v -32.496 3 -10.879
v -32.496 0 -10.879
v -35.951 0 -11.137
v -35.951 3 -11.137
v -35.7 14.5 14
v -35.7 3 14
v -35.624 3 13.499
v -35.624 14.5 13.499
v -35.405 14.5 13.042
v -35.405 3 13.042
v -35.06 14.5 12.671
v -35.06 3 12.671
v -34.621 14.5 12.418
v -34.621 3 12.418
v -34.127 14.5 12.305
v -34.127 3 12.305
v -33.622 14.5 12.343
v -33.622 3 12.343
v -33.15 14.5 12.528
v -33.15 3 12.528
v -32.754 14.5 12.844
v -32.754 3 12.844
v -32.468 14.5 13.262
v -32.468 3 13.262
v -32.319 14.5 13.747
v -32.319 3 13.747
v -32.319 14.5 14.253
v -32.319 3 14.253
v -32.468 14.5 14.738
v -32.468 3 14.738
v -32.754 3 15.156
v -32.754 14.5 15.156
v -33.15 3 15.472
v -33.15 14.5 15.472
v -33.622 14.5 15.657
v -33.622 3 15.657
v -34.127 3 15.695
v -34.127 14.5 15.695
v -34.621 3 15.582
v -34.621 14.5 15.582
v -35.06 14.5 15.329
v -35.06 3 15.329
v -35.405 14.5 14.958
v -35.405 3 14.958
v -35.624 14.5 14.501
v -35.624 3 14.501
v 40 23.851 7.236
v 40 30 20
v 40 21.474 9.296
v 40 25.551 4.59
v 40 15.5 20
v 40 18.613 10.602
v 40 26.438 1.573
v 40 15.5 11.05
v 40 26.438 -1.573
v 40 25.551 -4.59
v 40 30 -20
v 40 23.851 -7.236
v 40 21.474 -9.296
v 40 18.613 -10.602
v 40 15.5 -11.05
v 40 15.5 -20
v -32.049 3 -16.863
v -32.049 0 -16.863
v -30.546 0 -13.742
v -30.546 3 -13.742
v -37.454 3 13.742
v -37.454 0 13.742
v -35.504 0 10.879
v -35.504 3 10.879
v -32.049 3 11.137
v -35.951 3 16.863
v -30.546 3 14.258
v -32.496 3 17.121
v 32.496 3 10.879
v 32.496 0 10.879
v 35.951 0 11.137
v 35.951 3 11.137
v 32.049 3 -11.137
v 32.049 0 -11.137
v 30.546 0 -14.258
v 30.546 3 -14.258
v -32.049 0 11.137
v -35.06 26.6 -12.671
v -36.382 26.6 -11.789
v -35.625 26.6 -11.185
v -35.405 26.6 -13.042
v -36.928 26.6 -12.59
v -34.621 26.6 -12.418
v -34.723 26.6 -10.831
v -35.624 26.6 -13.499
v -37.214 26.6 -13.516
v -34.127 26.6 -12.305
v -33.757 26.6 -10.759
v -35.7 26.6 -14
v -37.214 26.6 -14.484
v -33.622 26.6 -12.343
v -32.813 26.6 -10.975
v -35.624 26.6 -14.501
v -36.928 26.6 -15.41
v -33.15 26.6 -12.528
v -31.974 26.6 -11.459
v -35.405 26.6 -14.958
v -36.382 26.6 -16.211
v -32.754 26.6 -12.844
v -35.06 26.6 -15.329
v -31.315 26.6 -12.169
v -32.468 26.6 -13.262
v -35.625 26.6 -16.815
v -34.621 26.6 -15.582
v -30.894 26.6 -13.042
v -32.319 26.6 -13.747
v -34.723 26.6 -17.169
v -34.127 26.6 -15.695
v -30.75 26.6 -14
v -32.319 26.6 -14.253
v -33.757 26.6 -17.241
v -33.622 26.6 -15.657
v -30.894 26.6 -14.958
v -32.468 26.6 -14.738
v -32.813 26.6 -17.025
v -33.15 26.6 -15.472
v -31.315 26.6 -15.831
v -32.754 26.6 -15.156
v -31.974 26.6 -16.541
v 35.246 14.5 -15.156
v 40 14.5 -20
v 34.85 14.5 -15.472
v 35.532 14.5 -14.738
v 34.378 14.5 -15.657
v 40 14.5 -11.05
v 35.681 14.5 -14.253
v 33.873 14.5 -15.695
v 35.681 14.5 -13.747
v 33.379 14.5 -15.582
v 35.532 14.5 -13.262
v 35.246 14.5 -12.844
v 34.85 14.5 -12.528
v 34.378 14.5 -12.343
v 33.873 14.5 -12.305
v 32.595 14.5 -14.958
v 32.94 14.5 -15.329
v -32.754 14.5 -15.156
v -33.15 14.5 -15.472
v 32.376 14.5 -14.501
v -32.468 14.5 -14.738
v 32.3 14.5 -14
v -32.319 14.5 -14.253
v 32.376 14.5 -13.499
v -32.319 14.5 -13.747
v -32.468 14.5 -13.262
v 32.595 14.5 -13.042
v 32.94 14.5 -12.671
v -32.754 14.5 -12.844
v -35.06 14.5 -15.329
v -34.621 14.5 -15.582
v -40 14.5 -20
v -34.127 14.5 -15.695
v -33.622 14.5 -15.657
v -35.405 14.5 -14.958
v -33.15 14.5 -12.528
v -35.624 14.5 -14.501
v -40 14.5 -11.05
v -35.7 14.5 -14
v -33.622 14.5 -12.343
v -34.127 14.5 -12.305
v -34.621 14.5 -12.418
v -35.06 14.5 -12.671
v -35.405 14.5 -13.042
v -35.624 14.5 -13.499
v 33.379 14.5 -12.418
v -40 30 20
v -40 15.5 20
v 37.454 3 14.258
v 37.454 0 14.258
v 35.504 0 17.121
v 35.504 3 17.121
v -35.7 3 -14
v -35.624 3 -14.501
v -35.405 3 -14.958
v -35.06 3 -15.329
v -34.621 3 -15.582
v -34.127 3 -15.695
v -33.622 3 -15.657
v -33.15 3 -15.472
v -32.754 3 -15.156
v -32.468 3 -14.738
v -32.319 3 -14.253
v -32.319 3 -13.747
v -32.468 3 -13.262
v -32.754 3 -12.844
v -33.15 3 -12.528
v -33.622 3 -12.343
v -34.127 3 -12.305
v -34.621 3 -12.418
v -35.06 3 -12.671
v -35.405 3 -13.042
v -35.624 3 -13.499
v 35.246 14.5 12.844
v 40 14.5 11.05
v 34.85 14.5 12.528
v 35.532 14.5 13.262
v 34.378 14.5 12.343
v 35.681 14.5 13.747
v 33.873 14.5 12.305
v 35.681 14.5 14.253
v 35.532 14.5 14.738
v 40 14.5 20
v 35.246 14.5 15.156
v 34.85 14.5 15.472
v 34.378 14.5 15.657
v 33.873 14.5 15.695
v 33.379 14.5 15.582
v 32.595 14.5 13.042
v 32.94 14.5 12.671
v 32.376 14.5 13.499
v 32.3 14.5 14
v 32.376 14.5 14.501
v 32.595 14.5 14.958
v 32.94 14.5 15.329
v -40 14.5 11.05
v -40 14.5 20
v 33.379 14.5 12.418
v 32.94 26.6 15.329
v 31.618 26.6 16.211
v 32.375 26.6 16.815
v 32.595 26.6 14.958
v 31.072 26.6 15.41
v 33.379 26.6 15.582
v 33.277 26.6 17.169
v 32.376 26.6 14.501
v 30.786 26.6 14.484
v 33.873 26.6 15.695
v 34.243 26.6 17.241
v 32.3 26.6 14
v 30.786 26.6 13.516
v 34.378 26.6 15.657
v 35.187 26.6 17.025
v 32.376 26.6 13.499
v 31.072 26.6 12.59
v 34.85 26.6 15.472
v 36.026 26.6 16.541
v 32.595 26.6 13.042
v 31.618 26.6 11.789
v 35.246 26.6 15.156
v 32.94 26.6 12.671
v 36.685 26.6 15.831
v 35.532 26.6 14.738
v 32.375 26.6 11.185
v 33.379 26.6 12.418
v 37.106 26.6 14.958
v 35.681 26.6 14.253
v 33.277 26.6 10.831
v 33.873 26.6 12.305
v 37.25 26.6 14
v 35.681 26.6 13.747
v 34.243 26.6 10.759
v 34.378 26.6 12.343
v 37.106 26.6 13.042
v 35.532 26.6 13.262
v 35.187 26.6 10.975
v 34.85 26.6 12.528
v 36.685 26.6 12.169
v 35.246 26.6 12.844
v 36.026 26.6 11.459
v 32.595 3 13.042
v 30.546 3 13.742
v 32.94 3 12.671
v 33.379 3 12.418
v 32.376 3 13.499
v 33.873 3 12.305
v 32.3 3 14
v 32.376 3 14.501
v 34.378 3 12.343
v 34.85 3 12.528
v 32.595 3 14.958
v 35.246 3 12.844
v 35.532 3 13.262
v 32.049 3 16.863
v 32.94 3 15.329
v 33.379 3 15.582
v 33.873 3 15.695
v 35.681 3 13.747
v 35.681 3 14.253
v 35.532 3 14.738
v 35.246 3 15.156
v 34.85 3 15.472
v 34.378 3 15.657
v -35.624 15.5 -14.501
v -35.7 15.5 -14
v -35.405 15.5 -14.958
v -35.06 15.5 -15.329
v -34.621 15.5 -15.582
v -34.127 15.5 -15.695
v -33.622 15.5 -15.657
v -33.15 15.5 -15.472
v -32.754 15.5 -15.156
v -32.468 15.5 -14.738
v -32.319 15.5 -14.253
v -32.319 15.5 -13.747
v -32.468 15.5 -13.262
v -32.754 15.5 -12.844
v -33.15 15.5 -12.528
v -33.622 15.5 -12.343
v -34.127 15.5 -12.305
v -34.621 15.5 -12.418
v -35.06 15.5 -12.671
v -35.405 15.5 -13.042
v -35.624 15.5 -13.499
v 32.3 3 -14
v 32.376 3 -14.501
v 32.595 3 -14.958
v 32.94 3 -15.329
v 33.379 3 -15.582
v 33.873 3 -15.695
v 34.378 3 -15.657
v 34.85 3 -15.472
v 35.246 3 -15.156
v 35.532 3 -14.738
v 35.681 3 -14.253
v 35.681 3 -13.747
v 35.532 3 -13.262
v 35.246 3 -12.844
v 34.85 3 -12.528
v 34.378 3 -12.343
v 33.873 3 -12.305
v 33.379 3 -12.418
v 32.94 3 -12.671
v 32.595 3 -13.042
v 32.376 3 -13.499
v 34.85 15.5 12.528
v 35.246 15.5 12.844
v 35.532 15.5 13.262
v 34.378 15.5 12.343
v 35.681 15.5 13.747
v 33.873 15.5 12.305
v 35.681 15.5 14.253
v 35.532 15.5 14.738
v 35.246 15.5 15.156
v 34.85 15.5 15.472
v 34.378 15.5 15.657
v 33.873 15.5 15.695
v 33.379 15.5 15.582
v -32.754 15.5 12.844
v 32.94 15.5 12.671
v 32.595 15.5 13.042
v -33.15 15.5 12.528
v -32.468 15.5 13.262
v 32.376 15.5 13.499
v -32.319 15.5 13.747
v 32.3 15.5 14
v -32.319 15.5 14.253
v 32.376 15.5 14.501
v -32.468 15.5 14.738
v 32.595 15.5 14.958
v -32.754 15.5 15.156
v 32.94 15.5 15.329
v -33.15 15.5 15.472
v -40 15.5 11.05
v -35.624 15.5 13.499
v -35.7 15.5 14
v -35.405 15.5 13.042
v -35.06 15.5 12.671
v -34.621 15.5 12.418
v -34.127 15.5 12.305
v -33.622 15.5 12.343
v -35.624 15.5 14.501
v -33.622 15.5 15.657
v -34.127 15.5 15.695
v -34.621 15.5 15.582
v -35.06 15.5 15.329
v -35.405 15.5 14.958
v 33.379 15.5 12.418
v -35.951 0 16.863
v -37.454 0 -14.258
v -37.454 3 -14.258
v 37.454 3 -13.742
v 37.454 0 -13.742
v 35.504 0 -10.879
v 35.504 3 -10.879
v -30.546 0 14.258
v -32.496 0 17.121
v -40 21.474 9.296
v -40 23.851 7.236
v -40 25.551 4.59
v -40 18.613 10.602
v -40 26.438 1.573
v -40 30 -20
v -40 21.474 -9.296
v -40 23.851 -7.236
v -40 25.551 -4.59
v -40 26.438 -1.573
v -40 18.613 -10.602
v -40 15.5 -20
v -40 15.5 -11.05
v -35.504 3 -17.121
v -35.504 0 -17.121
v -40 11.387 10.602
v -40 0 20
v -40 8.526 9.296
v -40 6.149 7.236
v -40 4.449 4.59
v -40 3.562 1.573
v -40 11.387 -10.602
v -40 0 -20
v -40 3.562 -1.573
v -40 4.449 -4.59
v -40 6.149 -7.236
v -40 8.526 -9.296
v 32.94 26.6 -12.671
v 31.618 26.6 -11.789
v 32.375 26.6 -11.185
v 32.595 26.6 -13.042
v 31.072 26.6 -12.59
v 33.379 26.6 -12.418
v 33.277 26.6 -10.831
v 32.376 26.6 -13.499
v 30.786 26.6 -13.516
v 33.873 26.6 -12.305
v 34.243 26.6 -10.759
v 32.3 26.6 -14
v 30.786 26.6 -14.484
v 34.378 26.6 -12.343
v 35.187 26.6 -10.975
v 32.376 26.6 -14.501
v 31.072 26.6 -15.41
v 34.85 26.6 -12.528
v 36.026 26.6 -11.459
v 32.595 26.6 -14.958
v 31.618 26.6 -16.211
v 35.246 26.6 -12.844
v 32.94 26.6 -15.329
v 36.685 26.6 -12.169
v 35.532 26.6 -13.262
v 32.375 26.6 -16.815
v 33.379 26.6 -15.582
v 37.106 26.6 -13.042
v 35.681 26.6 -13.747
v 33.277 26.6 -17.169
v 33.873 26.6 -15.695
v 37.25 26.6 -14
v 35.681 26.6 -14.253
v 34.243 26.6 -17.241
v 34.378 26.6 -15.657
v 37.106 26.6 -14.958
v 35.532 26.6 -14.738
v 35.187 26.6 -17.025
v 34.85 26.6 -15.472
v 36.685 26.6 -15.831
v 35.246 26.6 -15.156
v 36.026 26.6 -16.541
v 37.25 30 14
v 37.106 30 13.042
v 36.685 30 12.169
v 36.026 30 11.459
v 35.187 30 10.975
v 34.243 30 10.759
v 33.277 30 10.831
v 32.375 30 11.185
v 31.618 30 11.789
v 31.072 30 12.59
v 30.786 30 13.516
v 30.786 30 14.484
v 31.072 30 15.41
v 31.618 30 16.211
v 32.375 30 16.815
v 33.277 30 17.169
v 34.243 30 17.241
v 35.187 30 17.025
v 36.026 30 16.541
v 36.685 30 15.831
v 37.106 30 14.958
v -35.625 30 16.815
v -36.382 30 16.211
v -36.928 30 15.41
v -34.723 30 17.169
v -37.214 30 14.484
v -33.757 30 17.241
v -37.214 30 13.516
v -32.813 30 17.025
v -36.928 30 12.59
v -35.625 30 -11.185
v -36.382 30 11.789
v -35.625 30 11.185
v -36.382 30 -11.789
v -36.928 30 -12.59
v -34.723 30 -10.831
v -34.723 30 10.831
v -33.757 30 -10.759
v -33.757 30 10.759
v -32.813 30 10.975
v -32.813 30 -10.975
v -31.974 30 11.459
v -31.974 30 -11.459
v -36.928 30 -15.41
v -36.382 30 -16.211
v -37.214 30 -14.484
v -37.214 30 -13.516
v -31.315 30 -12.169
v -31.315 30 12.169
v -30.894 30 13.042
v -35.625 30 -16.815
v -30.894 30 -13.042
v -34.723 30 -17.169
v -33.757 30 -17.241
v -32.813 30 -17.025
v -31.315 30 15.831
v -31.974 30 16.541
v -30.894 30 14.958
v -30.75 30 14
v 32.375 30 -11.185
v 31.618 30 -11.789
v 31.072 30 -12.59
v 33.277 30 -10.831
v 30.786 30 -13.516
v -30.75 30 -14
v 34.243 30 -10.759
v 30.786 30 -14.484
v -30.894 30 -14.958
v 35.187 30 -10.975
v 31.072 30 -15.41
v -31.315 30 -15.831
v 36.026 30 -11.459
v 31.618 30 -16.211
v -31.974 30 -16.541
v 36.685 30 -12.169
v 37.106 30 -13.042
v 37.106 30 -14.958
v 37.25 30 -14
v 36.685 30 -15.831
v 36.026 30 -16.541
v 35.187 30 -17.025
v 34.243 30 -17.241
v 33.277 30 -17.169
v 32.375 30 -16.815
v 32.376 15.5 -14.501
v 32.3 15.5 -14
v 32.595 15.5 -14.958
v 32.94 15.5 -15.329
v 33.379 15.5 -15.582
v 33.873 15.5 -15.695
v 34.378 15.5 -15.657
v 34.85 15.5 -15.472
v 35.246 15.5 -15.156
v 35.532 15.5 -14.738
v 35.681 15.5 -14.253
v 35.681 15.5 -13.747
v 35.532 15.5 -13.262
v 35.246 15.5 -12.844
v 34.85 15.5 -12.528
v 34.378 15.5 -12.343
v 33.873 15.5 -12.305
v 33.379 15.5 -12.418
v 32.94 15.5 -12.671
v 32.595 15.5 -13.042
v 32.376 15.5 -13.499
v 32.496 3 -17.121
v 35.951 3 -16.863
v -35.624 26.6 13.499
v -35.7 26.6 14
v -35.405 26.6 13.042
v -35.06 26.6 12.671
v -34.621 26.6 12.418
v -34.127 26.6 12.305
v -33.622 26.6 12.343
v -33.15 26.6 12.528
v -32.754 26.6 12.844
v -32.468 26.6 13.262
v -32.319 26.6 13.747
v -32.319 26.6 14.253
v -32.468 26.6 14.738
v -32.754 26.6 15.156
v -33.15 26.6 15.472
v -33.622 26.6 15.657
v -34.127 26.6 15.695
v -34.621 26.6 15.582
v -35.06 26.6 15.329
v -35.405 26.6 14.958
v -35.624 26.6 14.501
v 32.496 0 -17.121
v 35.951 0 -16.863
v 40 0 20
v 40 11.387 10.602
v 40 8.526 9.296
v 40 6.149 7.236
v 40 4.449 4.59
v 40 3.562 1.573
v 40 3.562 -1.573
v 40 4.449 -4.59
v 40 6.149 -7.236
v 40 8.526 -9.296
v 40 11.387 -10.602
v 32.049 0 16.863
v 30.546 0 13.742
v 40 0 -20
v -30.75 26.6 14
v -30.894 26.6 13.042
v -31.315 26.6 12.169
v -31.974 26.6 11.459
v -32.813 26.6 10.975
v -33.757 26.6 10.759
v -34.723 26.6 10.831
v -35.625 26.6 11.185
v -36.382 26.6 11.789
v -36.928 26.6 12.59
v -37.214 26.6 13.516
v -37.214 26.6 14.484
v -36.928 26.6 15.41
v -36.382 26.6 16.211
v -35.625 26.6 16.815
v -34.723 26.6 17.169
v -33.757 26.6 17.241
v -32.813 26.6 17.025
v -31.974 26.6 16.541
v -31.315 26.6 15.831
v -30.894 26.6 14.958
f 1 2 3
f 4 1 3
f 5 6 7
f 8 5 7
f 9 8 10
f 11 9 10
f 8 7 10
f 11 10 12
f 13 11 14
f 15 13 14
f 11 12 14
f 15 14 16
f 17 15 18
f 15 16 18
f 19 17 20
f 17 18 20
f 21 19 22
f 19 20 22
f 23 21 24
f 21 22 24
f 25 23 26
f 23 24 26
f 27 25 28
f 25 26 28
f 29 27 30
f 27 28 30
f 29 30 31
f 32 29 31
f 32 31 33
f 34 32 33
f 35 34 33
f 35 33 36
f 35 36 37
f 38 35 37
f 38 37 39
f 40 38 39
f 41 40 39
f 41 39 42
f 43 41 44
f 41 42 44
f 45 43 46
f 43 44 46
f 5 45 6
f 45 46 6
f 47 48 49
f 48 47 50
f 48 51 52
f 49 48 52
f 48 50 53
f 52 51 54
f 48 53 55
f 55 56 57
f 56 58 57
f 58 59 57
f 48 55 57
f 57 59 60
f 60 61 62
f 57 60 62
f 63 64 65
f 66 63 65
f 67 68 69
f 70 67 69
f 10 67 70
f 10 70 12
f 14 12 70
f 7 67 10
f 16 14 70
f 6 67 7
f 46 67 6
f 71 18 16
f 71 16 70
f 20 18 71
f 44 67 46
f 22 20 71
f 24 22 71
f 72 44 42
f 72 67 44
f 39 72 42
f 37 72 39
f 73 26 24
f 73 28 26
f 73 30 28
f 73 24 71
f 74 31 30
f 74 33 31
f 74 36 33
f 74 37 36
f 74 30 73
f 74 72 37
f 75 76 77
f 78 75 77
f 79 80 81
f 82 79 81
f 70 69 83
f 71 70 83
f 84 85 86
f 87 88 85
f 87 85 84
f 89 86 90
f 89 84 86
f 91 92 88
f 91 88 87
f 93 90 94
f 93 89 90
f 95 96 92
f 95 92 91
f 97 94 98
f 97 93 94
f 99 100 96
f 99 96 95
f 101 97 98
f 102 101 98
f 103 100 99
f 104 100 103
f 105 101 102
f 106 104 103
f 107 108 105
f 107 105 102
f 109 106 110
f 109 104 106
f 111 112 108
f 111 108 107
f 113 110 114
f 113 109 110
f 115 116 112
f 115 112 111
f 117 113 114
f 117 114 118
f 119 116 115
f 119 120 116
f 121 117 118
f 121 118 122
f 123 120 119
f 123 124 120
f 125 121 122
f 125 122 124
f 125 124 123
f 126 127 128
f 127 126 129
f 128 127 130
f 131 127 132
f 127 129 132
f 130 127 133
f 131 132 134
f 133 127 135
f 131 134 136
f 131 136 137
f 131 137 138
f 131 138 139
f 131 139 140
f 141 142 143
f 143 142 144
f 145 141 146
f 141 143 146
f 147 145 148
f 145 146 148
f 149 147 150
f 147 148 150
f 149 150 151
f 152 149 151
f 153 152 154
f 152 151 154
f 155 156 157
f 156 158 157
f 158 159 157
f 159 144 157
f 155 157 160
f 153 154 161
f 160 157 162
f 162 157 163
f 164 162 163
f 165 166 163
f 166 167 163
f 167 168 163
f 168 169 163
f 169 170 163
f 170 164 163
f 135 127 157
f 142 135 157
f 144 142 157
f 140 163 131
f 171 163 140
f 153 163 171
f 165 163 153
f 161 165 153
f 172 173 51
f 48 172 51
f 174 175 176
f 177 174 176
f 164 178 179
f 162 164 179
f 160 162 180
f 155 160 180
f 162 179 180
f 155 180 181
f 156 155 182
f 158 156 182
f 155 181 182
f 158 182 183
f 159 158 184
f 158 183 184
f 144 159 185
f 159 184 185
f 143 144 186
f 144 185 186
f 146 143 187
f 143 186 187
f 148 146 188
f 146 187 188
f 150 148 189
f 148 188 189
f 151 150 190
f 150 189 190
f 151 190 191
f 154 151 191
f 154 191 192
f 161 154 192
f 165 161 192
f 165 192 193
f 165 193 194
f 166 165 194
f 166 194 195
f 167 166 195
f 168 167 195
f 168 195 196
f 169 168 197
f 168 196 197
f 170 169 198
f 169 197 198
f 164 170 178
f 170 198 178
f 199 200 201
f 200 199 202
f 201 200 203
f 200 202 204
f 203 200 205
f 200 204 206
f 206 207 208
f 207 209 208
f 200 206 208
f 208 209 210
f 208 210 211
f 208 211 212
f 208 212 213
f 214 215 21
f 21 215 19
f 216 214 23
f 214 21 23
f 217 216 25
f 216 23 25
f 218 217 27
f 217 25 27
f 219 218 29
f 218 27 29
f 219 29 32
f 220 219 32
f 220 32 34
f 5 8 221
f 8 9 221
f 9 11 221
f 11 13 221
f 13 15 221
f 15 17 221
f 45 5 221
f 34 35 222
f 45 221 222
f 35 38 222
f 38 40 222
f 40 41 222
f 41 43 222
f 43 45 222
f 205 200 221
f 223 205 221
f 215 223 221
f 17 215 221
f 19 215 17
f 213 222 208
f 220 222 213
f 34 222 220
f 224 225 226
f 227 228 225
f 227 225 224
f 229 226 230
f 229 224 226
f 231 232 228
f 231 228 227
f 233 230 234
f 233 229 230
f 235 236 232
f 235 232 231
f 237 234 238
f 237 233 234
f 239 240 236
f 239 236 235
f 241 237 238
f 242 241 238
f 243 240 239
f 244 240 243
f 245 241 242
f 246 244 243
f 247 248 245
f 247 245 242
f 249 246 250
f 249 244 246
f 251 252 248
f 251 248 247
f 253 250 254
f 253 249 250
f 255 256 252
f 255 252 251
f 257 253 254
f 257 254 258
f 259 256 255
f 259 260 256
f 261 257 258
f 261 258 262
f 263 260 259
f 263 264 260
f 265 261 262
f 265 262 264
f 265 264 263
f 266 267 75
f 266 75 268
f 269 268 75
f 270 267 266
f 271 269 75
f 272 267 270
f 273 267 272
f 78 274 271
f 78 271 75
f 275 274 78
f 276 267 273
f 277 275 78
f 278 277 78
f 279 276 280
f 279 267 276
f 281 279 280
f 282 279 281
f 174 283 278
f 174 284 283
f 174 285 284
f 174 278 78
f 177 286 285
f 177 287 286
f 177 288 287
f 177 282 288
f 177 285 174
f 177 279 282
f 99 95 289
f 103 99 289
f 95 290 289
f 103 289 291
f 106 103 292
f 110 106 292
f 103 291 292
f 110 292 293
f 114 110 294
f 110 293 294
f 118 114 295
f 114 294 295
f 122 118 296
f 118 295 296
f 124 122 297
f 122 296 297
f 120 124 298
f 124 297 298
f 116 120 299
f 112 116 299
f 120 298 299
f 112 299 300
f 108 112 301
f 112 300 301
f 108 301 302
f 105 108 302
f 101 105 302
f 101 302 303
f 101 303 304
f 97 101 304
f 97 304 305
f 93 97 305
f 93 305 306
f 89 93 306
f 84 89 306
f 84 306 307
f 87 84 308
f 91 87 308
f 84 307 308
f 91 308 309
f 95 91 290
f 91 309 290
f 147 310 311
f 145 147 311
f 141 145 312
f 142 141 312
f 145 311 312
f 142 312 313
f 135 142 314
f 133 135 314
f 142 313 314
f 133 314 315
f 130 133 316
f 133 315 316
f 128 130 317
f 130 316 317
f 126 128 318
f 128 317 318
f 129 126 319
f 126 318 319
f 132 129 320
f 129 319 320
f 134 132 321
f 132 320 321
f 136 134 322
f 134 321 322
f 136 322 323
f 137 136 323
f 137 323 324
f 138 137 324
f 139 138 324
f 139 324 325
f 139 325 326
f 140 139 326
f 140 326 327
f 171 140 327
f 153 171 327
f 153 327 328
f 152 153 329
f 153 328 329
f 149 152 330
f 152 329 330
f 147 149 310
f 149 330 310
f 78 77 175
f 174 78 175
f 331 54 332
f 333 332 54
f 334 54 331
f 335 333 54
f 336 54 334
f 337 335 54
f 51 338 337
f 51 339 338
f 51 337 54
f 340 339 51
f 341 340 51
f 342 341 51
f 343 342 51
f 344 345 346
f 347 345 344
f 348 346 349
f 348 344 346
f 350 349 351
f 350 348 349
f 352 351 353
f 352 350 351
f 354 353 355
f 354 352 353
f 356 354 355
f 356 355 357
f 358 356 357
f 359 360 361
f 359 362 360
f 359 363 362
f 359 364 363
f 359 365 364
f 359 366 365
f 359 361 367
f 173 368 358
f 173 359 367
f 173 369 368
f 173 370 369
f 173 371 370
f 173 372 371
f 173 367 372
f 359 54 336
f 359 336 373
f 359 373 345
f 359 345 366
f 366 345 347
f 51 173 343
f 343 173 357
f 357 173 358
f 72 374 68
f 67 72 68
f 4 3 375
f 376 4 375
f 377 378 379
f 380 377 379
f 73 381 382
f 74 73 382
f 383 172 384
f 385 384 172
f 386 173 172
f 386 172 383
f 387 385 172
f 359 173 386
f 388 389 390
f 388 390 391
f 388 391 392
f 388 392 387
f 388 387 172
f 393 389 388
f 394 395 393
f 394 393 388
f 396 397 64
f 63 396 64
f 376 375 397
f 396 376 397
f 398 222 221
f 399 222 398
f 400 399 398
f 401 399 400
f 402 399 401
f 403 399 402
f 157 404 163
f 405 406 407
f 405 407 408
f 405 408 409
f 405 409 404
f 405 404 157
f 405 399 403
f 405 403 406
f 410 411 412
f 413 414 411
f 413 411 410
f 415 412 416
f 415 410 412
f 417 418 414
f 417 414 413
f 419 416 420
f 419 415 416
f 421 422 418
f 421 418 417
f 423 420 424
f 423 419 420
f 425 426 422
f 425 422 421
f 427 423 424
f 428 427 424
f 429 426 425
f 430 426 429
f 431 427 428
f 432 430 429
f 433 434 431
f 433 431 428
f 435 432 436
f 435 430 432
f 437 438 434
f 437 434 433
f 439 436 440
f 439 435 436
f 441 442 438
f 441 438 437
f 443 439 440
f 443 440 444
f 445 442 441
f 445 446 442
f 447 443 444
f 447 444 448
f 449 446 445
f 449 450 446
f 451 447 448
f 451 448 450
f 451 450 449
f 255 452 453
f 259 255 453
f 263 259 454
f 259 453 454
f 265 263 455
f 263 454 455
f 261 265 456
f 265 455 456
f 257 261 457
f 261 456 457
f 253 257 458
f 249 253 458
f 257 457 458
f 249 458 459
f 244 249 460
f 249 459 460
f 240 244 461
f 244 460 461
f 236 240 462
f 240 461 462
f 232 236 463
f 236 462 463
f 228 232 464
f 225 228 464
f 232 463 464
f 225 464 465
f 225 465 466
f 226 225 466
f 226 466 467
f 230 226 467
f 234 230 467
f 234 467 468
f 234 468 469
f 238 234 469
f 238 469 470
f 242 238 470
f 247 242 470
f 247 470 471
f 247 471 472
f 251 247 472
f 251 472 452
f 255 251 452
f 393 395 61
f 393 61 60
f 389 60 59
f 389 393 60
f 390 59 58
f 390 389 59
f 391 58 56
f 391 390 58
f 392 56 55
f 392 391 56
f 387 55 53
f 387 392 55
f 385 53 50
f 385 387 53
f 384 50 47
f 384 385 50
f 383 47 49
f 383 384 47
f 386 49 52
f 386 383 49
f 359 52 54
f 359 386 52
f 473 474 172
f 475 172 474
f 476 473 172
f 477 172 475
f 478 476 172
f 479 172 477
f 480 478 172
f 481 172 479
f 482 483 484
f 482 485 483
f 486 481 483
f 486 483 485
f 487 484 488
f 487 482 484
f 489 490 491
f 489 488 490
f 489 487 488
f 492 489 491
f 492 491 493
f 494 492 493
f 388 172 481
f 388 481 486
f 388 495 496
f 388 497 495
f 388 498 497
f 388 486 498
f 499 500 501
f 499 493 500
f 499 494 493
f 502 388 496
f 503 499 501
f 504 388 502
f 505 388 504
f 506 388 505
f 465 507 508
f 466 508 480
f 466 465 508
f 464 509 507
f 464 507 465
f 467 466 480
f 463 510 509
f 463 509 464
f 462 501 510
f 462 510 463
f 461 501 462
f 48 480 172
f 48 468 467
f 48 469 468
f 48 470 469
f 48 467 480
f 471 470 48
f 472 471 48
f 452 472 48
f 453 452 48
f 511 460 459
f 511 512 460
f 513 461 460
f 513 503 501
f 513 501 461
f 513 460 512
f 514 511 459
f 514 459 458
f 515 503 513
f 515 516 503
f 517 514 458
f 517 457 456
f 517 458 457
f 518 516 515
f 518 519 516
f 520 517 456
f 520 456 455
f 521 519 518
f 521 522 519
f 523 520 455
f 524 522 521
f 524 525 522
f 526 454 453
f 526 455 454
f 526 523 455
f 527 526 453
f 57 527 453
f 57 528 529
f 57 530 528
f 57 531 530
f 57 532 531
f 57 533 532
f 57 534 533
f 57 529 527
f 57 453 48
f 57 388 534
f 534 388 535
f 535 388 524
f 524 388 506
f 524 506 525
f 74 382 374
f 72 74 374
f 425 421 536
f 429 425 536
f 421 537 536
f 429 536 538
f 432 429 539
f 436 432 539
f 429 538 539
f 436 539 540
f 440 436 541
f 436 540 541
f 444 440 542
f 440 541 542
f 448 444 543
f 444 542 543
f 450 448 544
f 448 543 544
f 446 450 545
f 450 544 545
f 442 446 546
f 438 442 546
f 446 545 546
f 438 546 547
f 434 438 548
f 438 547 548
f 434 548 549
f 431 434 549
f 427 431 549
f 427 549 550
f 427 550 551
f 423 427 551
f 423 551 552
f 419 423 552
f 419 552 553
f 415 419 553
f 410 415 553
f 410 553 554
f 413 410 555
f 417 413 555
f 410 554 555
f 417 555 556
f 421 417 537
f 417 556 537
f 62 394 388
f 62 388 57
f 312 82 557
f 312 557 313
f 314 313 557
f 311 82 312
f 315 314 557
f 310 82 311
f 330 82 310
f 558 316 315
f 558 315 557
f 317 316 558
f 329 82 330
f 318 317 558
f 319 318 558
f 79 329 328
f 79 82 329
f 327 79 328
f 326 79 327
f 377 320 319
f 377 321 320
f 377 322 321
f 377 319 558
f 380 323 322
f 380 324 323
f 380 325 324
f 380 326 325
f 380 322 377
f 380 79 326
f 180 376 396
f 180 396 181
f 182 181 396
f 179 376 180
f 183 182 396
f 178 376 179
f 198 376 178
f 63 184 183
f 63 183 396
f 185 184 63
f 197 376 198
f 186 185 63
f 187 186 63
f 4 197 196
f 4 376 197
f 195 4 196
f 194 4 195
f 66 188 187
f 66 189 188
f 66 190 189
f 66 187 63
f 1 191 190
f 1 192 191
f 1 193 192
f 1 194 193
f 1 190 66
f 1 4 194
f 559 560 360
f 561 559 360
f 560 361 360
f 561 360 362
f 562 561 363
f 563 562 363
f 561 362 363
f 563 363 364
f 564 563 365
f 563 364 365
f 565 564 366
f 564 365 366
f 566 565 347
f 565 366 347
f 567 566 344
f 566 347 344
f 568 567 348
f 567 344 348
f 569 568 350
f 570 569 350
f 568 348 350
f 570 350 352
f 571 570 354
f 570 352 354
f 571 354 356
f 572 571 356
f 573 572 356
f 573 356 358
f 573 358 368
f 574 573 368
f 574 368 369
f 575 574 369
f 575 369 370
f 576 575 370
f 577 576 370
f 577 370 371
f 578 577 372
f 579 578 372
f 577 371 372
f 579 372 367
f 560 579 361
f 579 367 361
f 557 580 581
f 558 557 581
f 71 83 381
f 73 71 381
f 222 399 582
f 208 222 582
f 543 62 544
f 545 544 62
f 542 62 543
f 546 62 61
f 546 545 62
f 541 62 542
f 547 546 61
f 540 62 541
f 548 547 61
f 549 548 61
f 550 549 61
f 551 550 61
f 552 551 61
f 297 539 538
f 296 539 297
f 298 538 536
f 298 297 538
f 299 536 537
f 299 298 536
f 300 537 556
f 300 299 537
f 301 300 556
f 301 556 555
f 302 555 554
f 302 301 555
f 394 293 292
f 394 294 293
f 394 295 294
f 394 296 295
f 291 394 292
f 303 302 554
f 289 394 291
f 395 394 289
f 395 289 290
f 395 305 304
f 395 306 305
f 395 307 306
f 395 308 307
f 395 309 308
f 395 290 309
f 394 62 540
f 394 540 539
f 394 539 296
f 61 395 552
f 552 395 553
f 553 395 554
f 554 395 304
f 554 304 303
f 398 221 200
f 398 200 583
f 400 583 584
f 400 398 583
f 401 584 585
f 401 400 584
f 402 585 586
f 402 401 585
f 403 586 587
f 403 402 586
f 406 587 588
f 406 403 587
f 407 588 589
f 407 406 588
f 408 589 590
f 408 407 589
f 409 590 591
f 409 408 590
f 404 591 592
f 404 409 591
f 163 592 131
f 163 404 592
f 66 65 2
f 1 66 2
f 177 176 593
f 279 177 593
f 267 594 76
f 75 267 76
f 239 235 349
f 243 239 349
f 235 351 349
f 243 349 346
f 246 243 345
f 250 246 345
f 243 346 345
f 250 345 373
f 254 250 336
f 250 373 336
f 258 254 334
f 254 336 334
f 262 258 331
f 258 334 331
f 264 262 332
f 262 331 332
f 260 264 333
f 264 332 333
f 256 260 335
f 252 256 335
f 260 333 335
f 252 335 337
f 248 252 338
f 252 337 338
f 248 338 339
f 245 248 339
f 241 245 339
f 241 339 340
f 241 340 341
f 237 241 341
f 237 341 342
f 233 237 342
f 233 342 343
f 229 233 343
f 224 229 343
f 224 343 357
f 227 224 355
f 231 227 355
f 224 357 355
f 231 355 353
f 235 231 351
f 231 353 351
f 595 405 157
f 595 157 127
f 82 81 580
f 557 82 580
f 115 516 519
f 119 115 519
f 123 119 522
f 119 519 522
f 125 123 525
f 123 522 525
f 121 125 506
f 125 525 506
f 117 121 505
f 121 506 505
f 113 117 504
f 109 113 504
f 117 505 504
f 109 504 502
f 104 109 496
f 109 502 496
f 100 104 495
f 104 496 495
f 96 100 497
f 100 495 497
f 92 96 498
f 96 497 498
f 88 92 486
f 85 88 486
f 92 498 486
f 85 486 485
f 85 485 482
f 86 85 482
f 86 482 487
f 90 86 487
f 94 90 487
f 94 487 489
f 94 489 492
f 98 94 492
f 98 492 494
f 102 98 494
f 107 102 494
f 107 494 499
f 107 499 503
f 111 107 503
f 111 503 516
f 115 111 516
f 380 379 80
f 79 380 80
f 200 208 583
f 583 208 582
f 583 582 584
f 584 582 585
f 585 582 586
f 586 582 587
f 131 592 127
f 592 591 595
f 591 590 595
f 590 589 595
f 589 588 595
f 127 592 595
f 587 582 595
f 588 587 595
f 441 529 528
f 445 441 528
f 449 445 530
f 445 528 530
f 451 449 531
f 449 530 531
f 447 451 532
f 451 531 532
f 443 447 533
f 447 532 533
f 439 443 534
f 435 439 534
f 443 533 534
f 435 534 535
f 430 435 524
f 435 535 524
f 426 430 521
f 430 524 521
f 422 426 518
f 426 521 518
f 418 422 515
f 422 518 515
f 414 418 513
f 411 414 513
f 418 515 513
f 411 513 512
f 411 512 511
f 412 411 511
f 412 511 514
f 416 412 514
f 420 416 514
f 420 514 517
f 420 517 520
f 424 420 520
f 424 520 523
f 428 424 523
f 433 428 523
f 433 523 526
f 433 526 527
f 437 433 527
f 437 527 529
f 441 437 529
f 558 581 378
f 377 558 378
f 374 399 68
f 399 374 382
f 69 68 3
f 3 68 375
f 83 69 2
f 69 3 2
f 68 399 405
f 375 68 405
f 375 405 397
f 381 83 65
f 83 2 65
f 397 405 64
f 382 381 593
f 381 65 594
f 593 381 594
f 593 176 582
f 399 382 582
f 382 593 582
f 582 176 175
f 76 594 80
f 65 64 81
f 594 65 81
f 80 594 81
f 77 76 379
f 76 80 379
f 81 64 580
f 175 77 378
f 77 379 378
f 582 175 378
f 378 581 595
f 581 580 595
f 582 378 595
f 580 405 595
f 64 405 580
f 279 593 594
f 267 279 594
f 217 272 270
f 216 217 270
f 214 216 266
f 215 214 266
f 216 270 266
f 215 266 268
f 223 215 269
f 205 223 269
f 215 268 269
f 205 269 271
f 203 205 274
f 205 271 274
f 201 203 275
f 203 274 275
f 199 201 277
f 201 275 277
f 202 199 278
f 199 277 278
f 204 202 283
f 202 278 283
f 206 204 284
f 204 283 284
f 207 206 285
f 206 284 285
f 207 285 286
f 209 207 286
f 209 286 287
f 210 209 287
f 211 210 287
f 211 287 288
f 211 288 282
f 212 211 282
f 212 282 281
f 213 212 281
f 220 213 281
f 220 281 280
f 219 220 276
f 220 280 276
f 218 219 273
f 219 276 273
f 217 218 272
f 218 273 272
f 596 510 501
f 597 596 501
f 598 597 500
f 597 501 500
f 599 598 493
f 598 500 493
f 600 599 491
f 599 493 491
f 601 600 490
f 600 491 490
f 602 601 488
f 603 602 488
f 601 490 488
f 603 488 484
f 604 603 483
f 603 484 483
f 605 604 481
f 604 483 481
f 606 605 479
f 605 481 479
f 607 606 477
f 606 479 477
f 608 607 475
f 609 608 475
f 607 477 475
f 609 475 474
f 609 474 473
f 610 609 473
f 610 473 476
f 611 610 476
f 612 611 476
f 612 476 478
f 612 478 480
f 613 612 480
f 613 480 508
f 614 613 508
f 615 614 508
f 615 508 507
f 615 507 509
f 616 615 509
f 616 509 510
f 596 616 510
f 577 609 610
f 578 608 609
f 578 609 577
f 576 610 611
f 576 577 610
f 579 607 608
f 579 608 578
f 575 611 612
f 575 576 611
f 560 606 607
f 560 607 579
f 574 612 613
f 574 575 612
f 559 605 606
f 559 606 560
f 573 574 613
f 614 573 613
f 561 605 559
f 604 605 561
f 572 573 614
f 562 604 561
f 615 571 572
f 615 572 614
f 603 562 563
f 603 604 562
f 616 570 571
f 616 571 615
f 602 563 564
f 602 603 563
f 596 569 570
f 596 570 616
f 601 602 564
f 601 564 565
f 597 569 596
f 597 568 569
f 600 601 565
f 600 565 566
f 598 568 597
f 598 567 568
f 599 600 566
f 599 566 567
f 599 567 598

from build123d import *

# Parameters (mm, degrees)
CROQUIS1_W                                           = 80
CROQUIS1_H                                           = 40
SALIENTE_EXTRUIR1_DEPTH                              = 30
CORTAR_EXTRUIR1_DEPTH                                = 81
CROQUIS3_W                                           = 40
CROQUIS3_H                                           = 1
CORTAR_EXTRUIR2_DEPTH                                = 81
REFRENTADO_PARA_TORNILLO_CON_CABEZA_HUEC_D           = 3.4
REFRENTADO_PARA_TORNILLO_CON_CABEZA_HUEC_CBORE_D     = 6.5
REFRENTADO_PARA_TORNILLO_CON_CABEZA_HUEC_CBORE_DEPTH = 3.4
CORTAR_EXTRUIR4_DEPTH                                = 3
MATRIZL1_COUNT                                       = 2
MATRIZL1_PITCH                                       = 68
MATRIZL1_COUNT_DIR2                                  = 2
MATRIZL1_PITCH_DIR2                                  = 28


with BuildPart() as part:
    # Croquis1 → Saliente-Extruir1 (new body)
    with BuildSketch(Plane(origin=(0, 0, 0), x_dir=(1, 0, 0), z_dir=(0, 1, 0))):
        Rectangle(CROQUIS1_W, CROQUIS1_H)
    extrude(amount=SALIENTE_EXTRUIR1_DEPTH)

    # Croquis2 → Cortar-Extruir1 (cut, through all)
    with BuildSketch(Plane.ZY.offset(40)):
        with BuildLine():
            Line((-11.05, 14.5), (11.05, 14.5))
            ThreePointArc((11.05, 14.5), (0, 3.45), (-11.05, 14.5))
        make_face()
        with BuildLine():
            Line((11.05, 15.5), (-11.05, 15.5))
            ThreePointArc((-11.05, 15.5), (0, 26.55), (11.05, 15.5))
        make_face()
    extrude(amount=-CORTAR_EXTRUIR1_DEPTH, mode=Mode.SUBTRACT)

    # Croquis3 → Cortar-Extruir2 (cut, through all)
    with BuildSketch(Plane.ZY.offset(40)):
        with Locations((0, 15)):
            Rectangle(CROQUIS3_W, CROQUIS3_H)
    extrude(amount=-CORTAR_EXTRUIR2_DEPTH, mode=Mode.SUBTRACT)

    # Refrentado para tornillo con cabeza hueca de M31 (through all)
    with Locations(Plane(origin=(0, 30, 0), x_dir=(1, 0, 0), z_dir=(0, 1, 0))):
        with Locations((-34, 14), (-34, -14), (34, 14), (34, -14)):
            CounterBoreHole(REFRENTADO_PARA_TORNILLO_CON_CABEZA_HUEC_D / 2, REFRENTADO_PARA_TORNILLO_CON_CABEZA_HUEC_CBORE_D / 2, REFRENTADO_PARA_TORNILLO_CON_CABEZA_HUEC_CBORE_DEPTH)

    # Croquis9 → Cortar-Extruir4 (cut)
    with BuildSketch(Plane.XZ):
        Polygon((-30.545509036, 14.25786077), (-32.496068495, 17.120607317), (-35.95055946, 16.862746547), (-37.454490964, 13.74213923), (-35.503931505, 10.879392683), (-32.04944054, 11.137253453), align=None)
    cortar_extruir4 = extrude(amount=-CORTAR_EXTRUIR4_DEPTH, mode=Mode.SUBTRACT)

    # MatrizL1: Cortar-Extruir4 2 × 2
    with Locations(*[(i * MATRIZL1_PITCH, 0, -j * MATRIZL1_PITCH_DIR2) for i in range(MATRIZL1_COUNT) for j in range(MATRIZL1_COUNT_DIR2) if (i, j) != (0, 0)]):
        add(cortar_extruir4, mode=Mode.SUBTRACT)


solid = part.part
